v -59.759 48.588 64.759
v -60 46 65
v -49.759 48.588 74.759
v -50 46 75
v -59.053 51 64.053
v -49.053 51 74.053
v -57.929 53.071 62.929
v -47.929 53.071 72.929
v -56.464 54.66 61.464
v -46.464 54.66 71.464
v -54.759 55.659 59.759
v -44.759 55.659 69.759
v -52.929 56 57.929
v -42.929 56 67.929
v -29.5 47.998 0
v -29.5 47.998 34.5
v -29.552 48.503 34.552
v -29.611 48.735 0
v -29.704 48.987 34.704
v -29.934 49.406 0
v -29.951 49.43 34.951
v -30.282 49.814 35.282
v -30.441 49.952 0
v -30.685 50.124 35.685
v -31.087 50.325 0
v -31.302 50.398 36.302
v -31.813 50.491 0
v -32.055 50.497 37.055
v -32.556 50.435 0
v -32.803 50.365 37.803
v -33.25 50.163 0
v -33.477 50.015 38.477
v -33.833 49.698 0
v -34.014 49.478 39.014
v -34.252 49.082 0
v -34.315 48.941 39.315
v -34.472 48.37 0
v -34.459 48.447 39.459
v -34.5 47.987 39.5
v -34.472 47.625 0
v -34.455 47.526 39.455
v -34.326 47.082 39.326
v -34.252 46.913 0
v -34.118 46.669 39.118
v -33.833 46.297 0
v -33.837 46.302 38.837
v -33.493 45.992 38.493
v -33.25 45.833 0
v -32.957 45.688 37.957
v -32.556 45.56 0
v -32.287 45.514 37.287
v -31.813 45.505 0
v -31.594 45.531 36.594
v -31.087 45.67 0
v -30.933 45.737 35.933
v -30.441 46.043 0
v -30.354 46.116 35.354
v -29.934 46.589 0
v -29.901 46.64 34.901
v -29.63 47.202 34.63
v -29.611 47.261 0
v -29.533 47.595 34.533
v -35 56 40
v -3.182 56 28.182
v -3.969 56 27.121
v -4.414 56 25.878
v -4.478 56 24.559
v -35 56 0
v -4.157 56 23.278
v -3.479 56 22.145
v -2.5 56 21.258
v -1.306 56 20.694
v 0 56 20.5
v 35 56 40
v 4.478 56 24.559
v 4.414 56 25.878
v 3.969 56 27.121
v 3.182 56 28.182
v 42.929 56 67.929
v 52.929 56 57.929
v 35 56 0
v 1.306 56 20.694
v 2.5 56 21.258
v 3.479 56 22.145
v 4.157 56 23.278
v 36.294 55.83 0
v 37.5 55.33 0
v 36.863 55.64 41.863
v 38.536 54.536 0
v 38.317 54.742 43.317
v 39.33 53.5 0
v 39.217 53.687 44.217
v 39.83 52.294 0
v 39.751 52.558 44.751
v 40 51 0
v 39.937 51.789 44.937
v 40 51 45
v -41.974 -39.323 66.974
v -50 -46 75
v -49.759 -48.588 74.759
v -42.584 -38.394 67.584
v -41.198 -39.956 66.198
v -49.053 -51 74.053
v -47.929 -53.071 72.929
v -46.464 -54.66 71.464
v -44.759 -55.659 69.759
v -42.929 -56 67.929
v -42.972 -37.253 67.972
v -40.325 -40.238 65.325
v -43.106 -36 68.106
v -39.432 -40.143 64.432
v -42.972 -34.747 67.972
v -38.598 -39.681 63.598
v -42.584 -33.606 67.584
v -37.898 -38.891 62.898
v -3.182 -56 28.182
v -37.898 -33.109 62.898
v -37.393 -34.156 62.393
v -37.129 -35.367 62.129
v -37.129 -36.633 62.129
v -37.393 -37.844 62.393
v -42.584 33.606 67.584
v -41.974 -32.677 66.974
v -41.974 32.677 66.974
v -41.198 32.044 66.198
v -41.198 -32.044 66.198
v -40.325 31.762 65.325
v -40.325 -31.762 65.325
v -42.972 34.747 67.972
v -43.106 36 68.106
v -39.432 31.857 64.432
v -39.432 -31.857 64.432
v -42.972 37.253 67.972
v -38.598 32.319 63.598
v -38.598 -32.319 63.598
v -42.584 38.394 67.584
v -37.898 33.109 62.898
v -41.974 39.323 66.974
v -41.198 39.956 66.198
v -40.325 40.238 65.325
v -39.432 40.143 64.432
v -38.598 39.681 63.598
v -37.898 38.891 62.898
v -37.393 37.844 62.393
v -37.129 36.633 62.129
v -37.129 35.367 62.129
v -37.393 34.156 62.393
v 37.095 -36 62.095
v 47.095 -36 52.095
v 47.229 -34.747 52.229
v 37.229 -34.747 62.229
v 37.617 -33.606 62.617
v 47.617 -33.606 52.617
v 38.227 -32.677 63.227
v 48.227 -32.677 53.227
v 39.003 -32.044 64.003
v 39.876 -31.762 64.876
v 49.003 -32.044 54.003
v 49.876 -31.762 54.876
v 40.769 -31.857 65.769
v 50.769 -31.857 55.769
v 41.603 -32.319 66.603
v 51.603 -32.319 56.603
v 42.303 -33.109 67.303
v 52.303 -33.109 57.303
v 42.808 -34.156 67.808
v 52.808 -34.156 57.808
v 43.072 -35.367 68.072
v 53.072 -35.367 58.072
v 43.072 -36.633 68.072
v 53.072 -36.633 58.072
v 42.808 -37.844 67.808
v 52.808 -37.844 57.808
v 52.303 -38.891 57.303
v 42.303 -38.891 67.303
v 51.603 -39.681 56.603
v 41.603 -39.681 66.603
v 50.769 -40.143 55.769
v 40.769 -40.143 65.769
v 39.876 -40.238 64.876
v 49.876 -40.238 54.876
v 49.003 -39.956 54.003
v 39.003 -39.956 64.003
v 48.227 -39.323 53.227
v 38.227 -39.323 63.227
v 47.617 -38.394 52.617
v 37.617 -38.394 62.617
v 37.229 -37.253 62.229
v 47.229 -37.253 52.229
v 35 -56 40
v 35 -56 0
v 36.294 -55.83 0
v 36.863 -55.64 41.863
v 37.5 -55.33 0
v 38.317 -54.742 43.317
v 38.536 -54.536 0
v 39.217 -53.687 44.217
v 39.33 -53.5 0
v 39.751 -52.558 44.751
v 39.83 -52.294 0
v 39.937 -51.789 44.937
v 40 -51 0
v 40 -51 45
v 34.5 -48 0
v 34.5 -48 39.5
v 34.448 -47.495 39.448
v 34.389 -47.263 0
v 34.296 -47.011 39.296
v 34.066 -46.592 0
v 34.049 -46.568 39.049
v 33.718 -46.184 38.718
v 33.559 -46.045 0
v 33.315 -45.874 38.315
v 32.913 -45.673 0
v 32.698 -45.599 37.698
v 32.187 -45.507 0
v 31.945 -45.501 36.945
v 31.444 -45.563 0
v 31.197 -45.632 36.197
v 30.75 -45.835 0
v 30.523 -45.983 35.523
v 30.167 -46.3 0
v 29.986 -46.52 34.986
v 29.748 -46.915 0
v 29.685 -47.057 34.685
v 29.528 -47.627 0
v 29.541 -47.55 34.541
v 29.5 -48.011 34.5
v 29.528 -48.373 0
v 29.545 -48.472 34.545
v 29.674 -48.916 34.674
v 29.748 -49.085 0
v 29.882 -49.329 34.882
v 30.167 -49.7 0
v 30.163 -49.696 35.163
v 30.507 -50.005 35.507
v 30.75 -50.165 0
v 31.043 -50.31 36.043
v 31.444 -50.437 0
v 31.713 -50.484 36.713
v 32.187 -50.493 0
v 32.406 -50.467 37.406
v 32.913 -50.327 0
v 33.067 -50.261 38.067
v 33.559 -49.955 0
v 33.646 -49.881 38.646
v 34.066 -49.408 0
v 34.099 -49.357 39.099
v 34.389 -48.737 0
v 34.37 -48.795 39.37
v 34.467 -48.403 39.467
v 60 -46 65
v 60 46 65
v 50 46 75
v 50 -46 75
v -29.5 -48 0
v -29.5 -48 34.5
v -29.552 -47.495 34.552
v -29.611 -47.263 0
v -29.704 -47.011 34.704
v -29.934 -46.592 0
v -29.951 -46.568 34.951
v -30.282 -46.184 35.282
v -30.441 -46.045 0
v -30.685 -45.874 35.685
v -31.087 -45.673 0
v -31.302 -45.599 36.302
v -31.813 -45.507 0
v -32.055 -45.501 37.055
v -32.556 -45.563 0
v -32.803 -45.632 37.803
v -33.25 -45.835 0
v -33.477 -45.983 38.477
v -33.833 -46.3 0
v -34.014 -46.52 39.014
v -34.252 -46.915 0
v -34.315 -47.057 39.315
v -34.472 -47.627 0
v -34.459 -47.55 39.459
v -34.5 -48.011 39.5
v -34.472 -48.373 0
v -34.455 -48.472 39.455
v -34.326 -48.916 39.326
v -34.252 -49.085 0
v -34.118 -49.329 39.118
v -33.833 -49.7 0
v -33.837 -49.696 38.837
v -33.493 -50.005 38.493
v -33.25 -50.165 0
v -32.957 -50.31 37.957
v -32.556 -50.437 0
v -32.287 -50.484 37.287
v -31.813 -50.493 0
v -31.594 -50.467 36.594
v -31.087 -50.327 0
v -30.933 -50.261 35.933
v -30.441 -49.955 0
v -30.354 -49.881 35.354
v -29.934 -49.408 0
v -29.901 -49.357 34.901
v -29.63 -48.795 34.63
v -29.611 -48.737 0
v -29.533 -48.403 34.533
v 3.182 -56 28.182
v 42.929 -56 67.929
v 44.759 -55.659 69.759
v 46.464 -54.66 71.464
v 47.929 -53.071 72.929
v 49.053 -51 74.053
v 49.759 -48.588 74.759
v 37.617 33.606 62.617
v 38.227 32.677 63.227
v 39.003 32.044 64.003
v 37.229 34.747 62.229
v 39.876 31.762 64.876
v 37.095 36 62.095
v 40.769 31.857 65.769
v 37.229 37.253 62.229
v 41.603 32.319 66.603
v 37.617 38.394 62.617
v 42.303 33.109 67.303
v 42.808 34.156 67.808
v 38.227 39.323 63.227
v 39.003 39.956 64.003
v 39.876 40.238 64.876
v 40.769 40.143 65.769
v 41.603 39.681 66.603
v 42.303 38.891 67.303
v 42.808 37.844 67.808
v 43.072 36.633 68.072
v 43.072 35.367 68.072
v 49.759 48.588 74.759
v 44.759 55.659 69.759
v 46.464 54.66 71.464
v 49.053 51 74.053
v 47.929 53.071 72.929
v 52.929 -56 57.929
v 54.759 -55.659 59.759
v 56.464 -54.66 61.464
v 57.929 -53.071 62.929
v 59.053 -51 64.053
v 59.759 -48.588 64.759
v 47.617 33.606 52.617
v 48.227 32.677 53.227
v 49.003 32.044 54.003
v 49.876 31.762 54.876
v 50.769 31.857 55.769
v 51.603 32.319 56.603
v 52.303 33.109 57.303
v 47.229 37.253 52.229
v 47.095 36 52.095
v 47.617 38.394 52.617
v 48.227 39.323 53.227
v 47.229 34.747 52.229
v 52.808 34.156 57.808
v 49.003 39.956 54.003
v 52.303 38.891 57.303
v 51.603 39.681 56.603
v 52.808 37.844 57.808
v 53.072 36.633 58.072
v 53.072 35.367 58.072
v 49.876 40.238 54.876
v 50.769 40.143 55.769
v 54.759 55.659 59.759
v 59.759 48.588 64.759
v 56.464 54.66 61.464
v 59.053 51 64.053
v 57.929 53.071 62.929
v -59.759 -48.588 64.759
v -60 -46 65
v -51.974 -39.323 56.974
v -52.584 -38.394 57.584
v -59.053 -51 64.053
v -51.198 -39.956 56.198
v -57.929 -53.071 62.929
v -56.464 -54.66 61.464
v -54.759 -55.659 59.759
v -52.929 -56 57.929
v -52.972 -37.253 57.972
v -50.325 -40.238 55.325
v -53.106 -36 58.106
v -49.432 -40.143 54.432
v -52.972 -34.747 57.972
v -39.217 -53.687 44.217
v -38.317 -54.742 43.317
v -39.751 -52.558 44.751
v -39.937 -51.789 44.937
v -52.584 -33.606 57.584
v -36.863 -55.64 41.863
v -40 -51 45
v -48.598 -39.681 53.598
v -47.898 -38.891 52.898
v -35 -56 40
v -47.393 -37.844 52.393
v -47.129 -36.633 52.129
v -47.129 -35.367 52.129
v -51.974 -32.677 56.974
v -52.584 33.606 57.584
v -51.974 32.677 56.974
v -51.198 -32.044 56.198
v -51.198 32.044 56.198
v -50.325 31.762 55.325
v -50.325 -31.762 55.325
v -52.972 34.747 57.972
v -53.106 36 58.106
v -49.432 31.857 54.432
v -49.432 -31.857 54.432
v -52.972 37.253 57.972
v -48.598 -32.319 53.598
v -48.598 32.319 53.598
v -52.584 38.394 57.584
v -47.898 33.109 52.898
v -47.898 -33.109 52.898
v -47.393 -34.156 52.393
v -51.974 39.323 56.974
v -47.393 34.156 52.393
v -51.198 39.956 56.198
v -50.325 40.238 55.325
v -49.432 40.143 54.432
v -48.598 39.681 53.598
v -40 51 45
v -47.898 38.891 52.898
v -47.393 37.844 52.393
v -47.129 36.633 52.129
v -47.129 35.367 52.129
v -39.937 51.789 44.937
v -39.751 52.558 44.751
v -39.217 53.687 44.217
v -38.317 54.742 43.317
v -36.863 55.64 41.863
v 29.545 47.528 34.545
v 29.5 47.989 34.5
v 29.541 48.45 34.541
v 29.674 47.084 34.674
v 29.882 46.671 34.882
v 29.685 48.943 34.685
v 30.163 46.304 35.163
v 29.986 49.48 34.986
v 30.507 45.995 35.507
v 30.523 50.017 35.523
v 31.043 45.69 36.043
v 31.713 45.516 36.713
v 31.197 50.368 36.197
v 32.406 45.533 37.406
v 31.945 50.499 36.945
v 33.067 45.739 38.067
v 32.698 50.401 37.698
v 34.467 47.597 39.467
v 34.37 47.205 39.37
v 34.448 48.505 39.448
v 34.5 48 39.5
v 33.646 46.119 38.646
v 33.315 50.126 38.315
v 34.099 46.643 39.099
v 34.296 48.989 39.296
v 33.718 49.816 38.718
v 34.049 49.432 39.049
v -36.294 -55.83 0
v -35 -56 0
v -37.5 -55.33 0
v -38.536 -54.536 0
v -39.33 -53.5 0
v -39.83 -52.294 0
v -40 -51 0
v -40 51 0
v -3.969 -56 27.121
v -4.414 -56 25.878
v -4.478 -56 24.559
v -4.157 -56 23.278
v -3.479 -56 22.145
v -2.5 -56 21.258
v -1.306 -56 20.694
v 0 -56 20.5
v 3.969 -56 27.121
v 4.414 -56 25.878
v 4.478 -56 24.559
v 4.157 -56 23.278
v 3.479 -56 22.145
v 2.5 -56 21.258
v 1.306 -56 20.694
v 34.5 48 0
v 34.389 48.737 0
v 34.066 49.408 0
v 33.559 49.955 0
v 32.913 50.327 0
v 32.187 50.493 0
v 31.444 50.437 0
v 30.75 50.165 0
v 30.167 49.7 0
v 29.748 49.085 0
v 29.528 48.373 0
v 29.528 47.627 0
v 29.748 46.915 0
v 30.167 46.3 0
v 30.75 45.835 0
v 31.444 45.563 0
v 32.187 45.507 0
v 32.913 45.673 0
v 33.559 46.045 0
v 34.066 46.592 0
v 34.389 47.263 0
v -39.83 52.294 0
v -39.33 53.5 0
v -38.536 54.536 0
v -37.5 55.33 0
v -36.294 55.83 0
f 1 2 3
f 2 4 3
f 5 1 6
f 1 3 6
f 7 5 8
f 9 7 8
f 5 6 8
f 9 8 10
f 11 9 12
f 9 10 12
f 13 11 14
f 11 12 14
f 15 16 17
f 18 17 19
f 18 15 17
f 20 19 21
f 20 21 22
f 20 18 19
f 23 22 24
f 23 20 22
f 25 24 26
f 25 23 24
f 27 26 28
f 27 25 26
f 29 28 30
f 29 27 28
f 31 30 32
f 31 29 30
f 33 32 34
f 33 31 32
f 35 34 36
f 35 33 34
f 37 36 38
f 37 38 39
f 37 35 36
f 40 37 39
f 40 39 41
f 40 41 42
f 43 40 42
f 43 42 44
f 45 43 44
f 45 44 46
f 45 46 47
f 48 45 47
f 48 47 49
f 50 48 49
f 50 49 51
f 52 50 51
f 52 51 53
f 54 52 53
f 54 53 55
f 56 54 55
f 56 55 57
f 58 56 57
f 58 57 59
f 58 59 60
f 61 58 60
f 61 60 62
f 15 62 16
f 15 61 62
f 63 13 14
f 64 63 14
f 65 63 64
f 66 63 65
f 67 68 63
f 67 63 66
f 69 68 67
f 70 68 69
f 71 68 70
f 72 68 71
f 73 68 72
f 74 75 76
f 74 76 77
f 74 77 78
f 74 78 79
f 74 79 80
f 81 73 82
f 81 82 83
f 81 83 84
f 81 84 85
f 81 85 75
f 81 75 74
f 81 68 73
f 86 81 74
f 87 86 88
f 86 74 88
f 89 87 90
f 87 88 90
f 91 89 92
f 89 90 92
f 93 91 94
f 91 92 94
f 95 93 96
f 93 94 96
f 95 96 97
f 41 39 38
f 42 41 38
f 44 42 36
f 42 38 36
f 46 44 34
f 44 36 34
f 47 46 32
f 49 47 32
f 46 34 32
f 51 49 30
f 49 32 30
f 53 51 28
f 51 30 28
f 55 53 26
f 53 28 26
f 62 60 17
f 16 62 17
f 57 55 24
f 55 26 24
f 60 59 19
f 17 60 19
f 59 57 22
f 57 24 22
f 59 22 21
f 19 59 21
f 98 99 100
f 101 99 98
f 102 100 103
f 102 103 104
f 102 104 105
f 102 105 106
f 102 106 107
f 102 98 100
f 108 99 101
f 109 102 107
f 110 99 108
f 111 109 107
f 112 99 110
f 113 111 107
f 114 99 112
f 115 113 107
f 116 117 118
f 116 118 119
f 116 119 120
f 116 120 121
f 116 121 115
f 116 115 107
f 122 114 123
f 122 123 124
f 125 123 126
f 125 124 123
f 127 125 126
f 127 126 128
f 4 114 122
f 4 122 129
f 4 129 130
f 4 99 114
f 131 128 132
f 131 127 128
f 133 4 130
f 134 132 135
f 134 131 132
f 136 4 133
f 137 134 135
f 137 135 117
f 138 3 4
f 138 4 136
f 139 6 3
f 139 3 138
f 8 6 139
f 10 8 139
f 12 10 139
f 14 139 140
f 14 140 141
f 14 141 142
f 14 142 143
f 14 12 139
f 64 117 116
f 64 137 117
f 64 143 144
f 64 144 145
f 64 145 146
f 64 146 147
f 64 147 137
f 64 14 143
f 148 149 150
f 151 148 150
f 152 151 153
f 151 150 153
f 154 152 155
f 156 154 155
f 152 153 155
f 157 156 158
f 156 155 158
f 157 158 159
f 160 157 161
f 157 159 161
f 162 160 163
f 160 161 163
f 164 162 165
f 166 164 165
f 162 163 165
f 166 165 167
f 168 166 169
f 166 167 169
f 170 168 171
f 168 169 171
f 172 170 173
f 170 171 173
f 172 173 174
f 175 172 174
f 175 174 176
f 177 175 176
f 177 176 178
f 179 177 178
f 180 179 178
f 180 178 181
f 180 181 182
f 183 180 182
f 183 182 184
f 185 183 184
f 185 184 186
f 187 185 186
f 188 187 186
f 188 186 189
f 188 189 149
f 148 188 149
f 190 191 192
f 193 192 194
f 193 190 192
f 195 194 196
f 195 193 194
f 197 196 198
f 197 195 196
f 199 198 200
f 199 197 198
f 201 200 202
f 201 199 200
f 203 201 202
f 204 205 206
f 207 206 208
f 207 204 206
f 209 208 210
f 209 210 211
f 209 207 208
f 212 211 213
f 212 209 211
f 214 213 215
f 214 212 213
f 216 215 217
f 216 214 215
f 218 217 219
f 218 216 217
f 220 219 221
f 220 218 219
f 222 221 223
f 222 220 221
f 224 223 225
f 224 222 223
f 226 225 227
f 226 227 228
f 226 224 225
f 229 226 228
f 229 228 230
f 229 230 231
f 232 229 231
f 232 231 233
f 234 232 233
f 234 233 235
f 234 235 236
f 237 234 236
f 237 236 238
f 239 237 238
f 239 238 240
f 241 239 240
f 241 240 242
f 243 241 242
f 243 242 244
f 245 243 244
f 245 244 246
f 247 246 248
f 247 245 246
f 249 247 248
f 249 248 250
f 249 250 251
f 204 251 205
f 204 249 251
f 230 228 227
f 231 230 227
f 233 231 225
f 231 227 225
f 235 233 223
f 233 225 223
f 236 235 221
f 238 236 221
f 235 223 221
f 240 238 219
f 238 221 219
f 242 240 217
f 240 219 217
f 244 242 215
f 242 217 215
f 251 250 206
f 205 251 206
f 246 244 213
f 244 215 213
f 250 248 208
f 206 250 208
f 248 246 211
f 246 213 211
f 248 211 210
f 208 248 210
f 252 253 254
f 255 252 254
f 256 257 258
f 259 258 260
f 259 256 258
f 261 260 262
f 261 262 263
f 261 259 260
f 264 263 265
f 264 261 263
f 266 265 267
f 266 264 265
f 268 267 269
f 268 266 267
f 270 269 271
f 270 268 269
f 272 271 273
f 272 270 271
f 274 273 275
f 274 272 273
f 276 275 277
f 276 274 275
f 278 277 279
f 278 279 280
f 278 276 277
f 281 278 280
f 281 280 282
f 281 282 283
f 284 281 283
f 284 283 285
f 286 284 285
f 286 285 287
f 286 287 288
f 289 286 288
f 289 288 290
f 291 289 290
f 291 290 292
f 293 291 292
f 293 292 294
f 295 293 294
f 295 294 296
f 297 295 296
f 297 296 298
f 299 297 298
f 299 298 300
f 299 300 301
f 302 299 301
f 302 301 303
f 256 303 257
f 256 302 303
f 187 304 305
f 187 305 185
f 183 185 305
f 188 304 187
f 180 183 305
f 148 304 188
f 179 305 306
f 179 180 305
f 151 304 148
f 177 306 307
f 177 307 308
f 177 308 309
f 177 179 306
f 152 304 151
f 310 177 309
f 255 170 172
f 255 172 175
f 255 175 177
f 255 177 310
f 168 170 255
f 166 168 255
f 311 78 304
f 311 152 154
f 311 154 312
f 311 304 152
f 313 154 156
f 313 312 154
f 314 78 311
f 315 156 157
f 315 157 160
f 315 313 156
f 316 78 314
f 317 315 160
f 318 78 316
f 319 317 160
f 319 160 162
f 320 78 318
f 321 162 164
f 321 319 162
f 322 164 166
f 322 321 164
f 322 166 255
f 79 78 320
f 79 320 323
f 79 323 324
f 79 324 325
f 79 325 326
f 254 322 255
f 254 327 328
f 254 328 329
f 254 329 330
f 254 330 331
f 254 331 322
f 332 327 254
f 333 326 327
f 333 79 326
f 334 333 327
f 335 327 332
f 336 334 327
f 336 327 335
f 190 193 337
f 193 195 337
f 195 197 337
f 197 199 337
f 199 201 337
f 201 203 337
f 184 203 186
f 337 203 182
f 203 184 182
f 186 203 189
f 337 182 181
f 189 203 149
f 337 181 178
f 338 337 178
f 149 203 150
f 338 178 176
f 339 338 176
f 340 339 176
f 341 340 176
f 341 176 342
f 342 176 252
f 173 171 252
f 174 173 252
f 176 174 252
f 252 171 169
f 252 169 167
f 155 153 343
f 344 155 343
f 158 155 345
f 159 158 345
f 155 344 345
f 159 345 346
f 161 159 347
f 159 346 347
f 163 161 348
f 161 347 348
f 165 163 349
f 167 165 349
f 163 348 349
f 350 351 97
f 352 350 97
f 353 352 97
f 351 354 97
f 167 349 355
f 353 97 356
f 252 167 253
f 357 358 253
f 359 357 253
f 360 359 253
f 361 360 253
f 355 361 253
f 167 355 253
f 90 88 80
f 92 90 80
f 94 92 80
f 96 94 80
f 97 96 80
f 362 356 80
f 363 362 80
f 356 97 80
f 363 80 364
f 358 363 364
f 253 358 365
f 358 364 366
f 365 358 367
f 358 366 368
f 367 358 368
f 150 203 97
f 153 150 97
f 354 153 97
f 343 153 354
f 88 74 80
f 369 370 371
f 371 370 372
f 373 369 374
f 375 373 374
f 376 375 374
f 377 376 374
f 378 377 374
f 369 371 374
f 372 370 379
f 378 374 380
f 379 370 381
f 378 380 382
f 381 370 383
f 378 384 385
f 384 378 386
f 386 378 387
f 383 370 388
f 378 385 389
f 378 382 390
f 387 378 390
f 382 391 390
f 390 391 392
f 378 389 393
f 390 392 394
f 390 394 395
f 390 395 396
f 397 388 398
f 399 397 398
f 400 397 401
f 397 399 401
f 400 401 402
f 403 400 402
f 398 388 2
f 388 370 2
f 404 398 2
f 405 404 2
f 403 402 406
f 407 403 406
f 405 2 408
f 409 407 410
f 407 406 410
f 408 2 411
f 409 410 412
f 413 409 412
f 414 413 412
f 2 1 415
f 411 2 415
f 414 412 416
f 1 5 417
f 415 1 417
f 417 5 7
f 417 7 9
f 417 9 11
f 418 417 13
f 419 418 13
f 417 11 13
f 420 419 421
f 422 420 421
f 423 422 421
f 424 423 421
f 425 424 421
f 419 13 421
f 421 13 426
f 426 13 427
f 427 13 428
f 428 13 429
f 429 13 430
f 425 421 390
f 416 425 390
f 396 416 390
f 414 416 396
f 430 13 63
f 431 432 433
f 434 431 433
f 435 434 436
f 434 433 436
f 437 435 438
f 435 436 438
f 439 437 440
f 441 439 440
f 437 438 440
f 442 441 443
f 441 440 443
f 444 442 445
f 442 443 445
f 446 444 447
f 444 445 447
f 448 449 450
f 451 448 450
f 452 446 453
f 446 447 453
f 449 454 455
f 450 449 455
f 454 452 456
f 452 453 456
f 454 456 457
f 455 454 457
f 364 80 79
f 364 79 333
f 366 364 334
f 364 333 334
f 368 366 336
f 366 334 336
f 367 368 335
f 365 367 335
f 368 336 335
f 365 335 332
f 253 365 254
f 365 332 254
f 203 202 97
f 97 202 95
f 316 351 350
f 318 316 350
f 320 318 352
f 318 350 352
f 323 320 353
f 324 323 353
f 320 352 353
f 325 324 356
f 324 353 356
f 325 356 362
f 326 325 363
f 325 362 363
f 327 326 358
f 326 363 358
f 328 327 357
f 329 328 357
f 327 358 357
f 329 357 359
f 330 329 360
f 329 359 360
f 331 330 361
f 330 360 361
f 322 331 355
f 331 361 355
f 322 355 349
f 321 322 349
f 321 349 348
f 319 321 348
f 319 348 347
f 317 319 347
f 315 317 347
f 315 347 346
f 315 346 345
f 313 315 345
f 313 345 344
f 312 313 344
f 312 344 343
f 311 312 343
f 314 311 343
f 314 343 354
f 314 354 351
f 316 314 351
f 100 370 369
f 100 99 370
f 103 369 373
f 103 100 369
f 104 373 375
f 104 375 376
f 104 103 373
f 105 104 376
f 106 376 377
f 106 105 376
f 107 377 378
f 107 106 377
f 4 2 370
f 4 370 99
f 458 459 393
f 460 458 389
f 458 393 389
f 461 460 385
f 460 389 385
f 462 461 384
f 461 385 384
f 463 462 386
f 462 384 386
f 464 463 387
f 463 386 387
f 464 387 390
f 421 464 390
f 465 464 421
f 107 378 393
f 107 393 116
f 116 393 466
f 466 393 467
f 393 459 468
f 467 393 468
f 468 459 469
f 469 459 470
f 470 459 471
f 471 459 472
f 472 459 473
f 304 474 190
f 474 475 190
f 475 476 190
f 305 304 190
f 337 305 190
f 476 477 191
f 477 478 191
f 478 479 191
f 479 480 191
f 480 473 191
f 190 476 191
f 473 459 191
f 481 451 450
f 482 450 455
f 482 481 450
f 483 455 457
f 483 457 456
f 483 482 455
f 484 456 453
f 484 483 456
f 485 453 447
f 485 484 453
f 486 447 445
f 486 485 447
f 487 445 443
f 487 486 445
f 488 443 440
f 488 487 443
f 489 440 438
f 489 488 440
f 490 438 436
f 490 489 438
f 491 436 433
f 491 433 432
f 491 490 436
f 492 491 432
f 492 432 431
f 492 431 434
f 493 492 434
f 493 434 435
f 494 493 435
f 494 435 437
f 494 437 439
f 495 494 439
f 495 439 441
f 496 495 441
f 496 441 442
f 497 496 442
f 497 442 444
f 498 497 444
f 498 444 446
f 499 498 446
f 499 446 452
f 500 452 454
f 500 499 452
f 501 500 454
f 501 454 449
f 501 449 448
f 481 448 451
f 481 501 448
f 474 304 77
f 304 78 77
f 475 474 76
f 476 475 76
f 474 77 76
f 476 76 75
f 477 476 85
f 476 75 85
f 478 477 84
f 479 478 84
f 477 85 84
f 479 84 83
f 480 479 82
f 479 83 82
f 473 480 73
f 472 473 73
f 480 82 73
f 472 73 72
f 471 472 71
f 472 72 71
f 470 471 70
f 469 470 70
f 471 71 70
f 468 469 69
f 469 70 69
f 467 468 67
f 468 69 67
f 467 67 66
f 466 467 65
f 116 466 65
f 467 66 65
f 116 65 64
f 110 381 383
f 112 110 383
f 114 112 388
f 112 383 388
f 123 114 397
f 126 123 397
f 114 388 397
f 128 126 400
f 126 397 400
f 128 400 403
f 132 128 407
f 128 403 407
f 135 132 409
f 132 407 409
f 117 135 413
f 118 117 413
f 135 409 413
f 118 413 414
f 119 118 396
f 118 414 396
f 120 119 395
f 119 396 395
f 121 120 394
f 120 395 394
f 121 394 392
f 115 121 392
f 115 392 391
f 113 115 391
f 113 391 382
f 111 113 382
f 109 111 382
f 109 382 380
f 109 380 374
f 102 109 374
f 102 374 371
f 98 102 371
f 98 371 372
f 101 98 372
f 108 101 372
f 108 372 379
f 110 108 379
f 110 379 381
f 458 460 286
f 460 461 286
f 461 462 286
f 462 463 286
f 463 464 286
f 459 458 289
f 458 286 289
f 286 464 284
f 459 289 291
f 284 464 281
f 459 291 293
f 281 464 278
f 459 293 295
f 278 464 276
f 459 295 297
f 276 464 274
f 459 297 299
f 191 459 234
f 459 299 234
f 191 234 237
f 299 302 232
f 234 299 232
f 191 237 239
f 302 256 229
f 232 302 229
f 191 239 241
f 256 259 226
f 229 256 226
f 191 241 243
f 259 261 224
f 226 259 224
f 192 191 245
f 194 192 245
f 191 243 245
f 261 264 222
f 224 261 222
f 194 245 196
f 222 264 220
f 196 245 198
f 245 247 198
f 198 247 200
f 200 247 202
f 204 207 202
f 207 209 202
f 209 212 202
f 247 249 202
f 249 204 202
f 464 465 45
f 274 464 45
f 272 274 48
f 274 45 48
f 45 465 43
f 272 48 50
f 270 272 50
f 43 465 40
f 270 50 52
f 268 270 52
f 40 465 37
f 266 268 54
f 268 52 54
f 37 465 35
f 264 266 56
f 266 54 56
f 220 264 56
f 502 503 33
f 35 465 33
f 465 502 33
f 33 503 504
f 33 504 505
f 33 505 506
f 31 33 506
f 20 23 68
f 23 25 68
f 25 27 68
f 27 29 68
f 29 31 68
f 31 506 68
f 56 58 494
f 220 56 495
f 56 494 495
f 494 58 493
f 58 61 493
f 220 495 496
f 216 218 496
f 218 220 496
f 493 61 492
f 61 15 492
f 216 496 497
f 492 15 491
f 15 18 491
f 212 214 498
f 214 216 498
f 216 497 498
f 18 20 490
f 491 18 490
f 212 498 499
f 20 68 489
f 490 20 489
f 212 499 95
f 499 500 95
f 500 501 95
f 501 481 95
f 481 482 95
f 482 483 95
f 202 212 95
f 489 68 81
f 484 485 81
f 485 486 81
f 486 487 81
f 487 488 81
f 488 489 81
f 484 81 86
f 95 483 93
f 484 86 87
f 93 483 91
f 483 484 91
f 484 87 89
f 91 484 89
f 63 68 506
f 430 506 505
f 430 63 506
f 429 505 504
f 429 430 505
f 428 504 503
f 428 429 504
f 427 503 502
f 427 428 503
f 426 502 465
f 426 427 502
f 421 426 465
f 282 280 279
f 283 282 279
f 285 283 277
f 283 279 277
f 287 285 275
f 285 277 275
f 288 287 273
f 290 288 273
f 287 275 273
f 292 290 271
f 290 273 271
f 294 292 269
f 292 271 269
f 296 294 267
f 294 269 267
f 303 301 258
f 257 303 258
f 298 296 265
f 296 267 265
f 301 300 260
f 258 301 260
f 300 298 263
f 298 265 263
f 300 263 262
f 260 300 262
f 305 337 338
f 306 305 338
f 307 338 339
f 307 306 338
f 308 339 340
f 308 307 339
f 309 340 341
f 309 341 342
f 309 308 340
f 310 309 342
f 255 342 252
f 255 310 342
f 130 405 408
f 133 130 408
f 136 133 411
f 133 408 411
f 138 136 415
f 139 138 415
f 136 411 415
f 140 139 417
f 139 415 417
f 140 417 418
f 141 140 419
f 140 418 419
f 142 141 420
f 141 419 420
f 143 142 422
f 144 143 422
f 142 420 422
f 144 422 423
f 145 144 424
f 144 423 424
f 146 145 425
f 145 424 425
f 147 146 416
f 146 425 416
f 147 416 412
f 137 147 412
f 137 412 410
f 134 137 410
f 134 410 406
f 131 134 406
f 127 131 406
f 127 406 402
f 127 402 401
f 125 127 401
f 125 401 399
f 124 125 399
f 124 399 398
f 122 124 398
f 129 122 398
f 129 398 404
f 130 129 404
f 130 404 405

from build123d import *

# Parameters (mm, degrees)
ESQUISSE1_W                  = 80
ESQUISSE1_H                  = 112
BOSS_EXTRU_1_DEPTH           = 100
ESQUISSE4_R                  = 2.5
ENL_V_MAT_EXTRU_2_DEPTH      = 100
ENL_V_MAT_EXTRU_2_DEPTH_BACK = 1
BOSS_EXTRU_2_DEPTH           = 112
BOSS_EXTRU_4_DEPTH           = 112
ENL_V_MAT_EXTRU_6_DEPTH      = 112
ESQUISSE16_R                 = 4.25
ENL_V_MAT_EXTRU_7_DEPTH      = 112
ESQUISSE15_R                 = 4.25
ENL_V_MAT_EXTRU_10_DEPTH     = 112
CONG_1_R                     = 10
CONG_2_R                     = 5
ESQUISSE17_R                 = 4.5
ENL_V_MAT_EXTRU_12_DEPTH     = 112


with BuildPart() as part:
    # Esquisse1 → Boss.-Extru.1 (new body)
    with BuildSketch(Plane.XY):
        Rectangle(ESQUISSE1_W, ESQUISSE1_H)
    extrude(amount=BOSS_EXTRU_1_DEPTH)

    # Esquisse4 → Enlèv. mat.-Extru.2 (cut, two sides)
    with BuildSketch(Plane.XY) as enl_v_mat_extru_2_sk:
        with Locations((-32, 47.99765818)):
            Circle(ESQUISSE4_R)
        with Locations((32, 48)):
            Circle(ESQUISSE4_R)
        with Locations((-32, -48)):
            Circle(ESQUISSE4_R)
        with Locations((32, -48)):
            Circle(ESQUISSE4_R)
    extrude(amount=ENL_V_MAT_EXTRU_2_DEPTH, mode=Mode.SUBTRACT)
    extrude(enl_v_mat_extru_2_sk.sketch, amount=-ENL_V_MAT_EXTRU_2_DEPTH_BACK, mode=Mode.SUBTRACT)

    # Esquisse11 → Boss.-Extru.2 (add)
    with BuildSketch(Plane(origin=(0, 56, 0), x_dir=(1, 0, 0), z_dir=(0, 1, 0))):
        Polygon((-60, -65), (0, -5), (60, -65), align=None)
    extrude(amount=-BOSS_EXTRU_2_DEPTH)

    # Esquisse13 → Boss.-Extru.4 (add)
    with BuildSketch(Plane(origin=(0, 56, 0), x_dir=(1, 0, 0), z_dir=(0, 1, 0))):
        Polygon((-60, -65), (-40, -85), (-40, -65), align=None)
        Polygon((60, -65), (40, -85), (40, -65), align=None)
    extrude(amount=-BOSS_EXTRU_4_DEPTH)

    # Esquisse14 → Enlèv. mat.-Extru.6 (cut)
    with BuildSketch(Plane(origin=(0, 56, 0), x_dir=(1, 0, 0), z_dir=(0, 1, 0))):
        Polygon((-50, -75), (0, -25), (50, -75), (40, -85), (40, -100), (-40, -100), (-40, -85), align=None)
    extrude(amount=-ENL_V_MAT_EXTRU_6_DEPTH, mode=Mode.SUBTRACT)

    # Esquisse16 → Enlèv. mat.-Extru.7 (cut)
    with BuildSketch(Plane(origin=(2.5, 0, 2.5), x_dir=(-0.707106781, 0, 0.707106781), z_dir=(-0.707106781, 0, -0.707106781))):
        with Locations((74.388347648, 36)):
            Circle(ESQUISSE16_R)
        with Locations((74.388347648, -36)):
            Circle(ESQUISSE16_R)
    extrude(amount=-ENL_V_MAT_EXTRU_7_DEPTH, mode=Mode.SUBTRACT)

    # Esquisse15 → Enlèv. mat.-Extru.10 (cut)
    with BuildSketch(Plane(origin=(-2.5, 0, 2.5), x_dir=(-0.707106781, 0, -0.707106781), z_dir=(0.707106781, 0, -0.707106781))):
        with Locations((-74.388347648, 36)):
            Circle(ESQUISSE15_R)
        with Locations((-74.388347648, -36)):
            Circle(ESQUISSE15_R)
    extrude(amount=-ENL_V_MAT_EXTRU_10_DEPTH, mode=Mode.SUBTRACT)

    # Congé1
    cong_1_edges = [part.edges().sort_by_distance(p)[0] for p in [
        (-55, -56, 70),
        (-55, 56, 70),
        (55, 56, 70),
        (55, -56, 70),
    ]]
    fillet(cong_1_edges, radius=CONG_1_R)

    # Congé2
    cong_2_edges = [part.edges().sort_by_distance(p)[0] for p in [
        (40, -56, 22.5),
        (-40, -56, 22.5),
        (-40, 56, 22.5),
        (40, 56, 22.5),
    ]]
    fillet(cong_2_edges, radius=CONG_2_R)

    # Esquisse17 → Enlèv. mat.-Extru.12 (cut)
    with BuildSketch(Plane(origin=(0, 56, 0), x_dir=(1, 0, 0), z_dir=(0, 1, 0))):
        with Locations((0, -25)):
            Circle(ESQUISSE17_R)
    extrude(amount=-ENL_V_MAT_EXTRU_12_DEPTH, mode=Mode.SUBTRACT)


solid = part.part
